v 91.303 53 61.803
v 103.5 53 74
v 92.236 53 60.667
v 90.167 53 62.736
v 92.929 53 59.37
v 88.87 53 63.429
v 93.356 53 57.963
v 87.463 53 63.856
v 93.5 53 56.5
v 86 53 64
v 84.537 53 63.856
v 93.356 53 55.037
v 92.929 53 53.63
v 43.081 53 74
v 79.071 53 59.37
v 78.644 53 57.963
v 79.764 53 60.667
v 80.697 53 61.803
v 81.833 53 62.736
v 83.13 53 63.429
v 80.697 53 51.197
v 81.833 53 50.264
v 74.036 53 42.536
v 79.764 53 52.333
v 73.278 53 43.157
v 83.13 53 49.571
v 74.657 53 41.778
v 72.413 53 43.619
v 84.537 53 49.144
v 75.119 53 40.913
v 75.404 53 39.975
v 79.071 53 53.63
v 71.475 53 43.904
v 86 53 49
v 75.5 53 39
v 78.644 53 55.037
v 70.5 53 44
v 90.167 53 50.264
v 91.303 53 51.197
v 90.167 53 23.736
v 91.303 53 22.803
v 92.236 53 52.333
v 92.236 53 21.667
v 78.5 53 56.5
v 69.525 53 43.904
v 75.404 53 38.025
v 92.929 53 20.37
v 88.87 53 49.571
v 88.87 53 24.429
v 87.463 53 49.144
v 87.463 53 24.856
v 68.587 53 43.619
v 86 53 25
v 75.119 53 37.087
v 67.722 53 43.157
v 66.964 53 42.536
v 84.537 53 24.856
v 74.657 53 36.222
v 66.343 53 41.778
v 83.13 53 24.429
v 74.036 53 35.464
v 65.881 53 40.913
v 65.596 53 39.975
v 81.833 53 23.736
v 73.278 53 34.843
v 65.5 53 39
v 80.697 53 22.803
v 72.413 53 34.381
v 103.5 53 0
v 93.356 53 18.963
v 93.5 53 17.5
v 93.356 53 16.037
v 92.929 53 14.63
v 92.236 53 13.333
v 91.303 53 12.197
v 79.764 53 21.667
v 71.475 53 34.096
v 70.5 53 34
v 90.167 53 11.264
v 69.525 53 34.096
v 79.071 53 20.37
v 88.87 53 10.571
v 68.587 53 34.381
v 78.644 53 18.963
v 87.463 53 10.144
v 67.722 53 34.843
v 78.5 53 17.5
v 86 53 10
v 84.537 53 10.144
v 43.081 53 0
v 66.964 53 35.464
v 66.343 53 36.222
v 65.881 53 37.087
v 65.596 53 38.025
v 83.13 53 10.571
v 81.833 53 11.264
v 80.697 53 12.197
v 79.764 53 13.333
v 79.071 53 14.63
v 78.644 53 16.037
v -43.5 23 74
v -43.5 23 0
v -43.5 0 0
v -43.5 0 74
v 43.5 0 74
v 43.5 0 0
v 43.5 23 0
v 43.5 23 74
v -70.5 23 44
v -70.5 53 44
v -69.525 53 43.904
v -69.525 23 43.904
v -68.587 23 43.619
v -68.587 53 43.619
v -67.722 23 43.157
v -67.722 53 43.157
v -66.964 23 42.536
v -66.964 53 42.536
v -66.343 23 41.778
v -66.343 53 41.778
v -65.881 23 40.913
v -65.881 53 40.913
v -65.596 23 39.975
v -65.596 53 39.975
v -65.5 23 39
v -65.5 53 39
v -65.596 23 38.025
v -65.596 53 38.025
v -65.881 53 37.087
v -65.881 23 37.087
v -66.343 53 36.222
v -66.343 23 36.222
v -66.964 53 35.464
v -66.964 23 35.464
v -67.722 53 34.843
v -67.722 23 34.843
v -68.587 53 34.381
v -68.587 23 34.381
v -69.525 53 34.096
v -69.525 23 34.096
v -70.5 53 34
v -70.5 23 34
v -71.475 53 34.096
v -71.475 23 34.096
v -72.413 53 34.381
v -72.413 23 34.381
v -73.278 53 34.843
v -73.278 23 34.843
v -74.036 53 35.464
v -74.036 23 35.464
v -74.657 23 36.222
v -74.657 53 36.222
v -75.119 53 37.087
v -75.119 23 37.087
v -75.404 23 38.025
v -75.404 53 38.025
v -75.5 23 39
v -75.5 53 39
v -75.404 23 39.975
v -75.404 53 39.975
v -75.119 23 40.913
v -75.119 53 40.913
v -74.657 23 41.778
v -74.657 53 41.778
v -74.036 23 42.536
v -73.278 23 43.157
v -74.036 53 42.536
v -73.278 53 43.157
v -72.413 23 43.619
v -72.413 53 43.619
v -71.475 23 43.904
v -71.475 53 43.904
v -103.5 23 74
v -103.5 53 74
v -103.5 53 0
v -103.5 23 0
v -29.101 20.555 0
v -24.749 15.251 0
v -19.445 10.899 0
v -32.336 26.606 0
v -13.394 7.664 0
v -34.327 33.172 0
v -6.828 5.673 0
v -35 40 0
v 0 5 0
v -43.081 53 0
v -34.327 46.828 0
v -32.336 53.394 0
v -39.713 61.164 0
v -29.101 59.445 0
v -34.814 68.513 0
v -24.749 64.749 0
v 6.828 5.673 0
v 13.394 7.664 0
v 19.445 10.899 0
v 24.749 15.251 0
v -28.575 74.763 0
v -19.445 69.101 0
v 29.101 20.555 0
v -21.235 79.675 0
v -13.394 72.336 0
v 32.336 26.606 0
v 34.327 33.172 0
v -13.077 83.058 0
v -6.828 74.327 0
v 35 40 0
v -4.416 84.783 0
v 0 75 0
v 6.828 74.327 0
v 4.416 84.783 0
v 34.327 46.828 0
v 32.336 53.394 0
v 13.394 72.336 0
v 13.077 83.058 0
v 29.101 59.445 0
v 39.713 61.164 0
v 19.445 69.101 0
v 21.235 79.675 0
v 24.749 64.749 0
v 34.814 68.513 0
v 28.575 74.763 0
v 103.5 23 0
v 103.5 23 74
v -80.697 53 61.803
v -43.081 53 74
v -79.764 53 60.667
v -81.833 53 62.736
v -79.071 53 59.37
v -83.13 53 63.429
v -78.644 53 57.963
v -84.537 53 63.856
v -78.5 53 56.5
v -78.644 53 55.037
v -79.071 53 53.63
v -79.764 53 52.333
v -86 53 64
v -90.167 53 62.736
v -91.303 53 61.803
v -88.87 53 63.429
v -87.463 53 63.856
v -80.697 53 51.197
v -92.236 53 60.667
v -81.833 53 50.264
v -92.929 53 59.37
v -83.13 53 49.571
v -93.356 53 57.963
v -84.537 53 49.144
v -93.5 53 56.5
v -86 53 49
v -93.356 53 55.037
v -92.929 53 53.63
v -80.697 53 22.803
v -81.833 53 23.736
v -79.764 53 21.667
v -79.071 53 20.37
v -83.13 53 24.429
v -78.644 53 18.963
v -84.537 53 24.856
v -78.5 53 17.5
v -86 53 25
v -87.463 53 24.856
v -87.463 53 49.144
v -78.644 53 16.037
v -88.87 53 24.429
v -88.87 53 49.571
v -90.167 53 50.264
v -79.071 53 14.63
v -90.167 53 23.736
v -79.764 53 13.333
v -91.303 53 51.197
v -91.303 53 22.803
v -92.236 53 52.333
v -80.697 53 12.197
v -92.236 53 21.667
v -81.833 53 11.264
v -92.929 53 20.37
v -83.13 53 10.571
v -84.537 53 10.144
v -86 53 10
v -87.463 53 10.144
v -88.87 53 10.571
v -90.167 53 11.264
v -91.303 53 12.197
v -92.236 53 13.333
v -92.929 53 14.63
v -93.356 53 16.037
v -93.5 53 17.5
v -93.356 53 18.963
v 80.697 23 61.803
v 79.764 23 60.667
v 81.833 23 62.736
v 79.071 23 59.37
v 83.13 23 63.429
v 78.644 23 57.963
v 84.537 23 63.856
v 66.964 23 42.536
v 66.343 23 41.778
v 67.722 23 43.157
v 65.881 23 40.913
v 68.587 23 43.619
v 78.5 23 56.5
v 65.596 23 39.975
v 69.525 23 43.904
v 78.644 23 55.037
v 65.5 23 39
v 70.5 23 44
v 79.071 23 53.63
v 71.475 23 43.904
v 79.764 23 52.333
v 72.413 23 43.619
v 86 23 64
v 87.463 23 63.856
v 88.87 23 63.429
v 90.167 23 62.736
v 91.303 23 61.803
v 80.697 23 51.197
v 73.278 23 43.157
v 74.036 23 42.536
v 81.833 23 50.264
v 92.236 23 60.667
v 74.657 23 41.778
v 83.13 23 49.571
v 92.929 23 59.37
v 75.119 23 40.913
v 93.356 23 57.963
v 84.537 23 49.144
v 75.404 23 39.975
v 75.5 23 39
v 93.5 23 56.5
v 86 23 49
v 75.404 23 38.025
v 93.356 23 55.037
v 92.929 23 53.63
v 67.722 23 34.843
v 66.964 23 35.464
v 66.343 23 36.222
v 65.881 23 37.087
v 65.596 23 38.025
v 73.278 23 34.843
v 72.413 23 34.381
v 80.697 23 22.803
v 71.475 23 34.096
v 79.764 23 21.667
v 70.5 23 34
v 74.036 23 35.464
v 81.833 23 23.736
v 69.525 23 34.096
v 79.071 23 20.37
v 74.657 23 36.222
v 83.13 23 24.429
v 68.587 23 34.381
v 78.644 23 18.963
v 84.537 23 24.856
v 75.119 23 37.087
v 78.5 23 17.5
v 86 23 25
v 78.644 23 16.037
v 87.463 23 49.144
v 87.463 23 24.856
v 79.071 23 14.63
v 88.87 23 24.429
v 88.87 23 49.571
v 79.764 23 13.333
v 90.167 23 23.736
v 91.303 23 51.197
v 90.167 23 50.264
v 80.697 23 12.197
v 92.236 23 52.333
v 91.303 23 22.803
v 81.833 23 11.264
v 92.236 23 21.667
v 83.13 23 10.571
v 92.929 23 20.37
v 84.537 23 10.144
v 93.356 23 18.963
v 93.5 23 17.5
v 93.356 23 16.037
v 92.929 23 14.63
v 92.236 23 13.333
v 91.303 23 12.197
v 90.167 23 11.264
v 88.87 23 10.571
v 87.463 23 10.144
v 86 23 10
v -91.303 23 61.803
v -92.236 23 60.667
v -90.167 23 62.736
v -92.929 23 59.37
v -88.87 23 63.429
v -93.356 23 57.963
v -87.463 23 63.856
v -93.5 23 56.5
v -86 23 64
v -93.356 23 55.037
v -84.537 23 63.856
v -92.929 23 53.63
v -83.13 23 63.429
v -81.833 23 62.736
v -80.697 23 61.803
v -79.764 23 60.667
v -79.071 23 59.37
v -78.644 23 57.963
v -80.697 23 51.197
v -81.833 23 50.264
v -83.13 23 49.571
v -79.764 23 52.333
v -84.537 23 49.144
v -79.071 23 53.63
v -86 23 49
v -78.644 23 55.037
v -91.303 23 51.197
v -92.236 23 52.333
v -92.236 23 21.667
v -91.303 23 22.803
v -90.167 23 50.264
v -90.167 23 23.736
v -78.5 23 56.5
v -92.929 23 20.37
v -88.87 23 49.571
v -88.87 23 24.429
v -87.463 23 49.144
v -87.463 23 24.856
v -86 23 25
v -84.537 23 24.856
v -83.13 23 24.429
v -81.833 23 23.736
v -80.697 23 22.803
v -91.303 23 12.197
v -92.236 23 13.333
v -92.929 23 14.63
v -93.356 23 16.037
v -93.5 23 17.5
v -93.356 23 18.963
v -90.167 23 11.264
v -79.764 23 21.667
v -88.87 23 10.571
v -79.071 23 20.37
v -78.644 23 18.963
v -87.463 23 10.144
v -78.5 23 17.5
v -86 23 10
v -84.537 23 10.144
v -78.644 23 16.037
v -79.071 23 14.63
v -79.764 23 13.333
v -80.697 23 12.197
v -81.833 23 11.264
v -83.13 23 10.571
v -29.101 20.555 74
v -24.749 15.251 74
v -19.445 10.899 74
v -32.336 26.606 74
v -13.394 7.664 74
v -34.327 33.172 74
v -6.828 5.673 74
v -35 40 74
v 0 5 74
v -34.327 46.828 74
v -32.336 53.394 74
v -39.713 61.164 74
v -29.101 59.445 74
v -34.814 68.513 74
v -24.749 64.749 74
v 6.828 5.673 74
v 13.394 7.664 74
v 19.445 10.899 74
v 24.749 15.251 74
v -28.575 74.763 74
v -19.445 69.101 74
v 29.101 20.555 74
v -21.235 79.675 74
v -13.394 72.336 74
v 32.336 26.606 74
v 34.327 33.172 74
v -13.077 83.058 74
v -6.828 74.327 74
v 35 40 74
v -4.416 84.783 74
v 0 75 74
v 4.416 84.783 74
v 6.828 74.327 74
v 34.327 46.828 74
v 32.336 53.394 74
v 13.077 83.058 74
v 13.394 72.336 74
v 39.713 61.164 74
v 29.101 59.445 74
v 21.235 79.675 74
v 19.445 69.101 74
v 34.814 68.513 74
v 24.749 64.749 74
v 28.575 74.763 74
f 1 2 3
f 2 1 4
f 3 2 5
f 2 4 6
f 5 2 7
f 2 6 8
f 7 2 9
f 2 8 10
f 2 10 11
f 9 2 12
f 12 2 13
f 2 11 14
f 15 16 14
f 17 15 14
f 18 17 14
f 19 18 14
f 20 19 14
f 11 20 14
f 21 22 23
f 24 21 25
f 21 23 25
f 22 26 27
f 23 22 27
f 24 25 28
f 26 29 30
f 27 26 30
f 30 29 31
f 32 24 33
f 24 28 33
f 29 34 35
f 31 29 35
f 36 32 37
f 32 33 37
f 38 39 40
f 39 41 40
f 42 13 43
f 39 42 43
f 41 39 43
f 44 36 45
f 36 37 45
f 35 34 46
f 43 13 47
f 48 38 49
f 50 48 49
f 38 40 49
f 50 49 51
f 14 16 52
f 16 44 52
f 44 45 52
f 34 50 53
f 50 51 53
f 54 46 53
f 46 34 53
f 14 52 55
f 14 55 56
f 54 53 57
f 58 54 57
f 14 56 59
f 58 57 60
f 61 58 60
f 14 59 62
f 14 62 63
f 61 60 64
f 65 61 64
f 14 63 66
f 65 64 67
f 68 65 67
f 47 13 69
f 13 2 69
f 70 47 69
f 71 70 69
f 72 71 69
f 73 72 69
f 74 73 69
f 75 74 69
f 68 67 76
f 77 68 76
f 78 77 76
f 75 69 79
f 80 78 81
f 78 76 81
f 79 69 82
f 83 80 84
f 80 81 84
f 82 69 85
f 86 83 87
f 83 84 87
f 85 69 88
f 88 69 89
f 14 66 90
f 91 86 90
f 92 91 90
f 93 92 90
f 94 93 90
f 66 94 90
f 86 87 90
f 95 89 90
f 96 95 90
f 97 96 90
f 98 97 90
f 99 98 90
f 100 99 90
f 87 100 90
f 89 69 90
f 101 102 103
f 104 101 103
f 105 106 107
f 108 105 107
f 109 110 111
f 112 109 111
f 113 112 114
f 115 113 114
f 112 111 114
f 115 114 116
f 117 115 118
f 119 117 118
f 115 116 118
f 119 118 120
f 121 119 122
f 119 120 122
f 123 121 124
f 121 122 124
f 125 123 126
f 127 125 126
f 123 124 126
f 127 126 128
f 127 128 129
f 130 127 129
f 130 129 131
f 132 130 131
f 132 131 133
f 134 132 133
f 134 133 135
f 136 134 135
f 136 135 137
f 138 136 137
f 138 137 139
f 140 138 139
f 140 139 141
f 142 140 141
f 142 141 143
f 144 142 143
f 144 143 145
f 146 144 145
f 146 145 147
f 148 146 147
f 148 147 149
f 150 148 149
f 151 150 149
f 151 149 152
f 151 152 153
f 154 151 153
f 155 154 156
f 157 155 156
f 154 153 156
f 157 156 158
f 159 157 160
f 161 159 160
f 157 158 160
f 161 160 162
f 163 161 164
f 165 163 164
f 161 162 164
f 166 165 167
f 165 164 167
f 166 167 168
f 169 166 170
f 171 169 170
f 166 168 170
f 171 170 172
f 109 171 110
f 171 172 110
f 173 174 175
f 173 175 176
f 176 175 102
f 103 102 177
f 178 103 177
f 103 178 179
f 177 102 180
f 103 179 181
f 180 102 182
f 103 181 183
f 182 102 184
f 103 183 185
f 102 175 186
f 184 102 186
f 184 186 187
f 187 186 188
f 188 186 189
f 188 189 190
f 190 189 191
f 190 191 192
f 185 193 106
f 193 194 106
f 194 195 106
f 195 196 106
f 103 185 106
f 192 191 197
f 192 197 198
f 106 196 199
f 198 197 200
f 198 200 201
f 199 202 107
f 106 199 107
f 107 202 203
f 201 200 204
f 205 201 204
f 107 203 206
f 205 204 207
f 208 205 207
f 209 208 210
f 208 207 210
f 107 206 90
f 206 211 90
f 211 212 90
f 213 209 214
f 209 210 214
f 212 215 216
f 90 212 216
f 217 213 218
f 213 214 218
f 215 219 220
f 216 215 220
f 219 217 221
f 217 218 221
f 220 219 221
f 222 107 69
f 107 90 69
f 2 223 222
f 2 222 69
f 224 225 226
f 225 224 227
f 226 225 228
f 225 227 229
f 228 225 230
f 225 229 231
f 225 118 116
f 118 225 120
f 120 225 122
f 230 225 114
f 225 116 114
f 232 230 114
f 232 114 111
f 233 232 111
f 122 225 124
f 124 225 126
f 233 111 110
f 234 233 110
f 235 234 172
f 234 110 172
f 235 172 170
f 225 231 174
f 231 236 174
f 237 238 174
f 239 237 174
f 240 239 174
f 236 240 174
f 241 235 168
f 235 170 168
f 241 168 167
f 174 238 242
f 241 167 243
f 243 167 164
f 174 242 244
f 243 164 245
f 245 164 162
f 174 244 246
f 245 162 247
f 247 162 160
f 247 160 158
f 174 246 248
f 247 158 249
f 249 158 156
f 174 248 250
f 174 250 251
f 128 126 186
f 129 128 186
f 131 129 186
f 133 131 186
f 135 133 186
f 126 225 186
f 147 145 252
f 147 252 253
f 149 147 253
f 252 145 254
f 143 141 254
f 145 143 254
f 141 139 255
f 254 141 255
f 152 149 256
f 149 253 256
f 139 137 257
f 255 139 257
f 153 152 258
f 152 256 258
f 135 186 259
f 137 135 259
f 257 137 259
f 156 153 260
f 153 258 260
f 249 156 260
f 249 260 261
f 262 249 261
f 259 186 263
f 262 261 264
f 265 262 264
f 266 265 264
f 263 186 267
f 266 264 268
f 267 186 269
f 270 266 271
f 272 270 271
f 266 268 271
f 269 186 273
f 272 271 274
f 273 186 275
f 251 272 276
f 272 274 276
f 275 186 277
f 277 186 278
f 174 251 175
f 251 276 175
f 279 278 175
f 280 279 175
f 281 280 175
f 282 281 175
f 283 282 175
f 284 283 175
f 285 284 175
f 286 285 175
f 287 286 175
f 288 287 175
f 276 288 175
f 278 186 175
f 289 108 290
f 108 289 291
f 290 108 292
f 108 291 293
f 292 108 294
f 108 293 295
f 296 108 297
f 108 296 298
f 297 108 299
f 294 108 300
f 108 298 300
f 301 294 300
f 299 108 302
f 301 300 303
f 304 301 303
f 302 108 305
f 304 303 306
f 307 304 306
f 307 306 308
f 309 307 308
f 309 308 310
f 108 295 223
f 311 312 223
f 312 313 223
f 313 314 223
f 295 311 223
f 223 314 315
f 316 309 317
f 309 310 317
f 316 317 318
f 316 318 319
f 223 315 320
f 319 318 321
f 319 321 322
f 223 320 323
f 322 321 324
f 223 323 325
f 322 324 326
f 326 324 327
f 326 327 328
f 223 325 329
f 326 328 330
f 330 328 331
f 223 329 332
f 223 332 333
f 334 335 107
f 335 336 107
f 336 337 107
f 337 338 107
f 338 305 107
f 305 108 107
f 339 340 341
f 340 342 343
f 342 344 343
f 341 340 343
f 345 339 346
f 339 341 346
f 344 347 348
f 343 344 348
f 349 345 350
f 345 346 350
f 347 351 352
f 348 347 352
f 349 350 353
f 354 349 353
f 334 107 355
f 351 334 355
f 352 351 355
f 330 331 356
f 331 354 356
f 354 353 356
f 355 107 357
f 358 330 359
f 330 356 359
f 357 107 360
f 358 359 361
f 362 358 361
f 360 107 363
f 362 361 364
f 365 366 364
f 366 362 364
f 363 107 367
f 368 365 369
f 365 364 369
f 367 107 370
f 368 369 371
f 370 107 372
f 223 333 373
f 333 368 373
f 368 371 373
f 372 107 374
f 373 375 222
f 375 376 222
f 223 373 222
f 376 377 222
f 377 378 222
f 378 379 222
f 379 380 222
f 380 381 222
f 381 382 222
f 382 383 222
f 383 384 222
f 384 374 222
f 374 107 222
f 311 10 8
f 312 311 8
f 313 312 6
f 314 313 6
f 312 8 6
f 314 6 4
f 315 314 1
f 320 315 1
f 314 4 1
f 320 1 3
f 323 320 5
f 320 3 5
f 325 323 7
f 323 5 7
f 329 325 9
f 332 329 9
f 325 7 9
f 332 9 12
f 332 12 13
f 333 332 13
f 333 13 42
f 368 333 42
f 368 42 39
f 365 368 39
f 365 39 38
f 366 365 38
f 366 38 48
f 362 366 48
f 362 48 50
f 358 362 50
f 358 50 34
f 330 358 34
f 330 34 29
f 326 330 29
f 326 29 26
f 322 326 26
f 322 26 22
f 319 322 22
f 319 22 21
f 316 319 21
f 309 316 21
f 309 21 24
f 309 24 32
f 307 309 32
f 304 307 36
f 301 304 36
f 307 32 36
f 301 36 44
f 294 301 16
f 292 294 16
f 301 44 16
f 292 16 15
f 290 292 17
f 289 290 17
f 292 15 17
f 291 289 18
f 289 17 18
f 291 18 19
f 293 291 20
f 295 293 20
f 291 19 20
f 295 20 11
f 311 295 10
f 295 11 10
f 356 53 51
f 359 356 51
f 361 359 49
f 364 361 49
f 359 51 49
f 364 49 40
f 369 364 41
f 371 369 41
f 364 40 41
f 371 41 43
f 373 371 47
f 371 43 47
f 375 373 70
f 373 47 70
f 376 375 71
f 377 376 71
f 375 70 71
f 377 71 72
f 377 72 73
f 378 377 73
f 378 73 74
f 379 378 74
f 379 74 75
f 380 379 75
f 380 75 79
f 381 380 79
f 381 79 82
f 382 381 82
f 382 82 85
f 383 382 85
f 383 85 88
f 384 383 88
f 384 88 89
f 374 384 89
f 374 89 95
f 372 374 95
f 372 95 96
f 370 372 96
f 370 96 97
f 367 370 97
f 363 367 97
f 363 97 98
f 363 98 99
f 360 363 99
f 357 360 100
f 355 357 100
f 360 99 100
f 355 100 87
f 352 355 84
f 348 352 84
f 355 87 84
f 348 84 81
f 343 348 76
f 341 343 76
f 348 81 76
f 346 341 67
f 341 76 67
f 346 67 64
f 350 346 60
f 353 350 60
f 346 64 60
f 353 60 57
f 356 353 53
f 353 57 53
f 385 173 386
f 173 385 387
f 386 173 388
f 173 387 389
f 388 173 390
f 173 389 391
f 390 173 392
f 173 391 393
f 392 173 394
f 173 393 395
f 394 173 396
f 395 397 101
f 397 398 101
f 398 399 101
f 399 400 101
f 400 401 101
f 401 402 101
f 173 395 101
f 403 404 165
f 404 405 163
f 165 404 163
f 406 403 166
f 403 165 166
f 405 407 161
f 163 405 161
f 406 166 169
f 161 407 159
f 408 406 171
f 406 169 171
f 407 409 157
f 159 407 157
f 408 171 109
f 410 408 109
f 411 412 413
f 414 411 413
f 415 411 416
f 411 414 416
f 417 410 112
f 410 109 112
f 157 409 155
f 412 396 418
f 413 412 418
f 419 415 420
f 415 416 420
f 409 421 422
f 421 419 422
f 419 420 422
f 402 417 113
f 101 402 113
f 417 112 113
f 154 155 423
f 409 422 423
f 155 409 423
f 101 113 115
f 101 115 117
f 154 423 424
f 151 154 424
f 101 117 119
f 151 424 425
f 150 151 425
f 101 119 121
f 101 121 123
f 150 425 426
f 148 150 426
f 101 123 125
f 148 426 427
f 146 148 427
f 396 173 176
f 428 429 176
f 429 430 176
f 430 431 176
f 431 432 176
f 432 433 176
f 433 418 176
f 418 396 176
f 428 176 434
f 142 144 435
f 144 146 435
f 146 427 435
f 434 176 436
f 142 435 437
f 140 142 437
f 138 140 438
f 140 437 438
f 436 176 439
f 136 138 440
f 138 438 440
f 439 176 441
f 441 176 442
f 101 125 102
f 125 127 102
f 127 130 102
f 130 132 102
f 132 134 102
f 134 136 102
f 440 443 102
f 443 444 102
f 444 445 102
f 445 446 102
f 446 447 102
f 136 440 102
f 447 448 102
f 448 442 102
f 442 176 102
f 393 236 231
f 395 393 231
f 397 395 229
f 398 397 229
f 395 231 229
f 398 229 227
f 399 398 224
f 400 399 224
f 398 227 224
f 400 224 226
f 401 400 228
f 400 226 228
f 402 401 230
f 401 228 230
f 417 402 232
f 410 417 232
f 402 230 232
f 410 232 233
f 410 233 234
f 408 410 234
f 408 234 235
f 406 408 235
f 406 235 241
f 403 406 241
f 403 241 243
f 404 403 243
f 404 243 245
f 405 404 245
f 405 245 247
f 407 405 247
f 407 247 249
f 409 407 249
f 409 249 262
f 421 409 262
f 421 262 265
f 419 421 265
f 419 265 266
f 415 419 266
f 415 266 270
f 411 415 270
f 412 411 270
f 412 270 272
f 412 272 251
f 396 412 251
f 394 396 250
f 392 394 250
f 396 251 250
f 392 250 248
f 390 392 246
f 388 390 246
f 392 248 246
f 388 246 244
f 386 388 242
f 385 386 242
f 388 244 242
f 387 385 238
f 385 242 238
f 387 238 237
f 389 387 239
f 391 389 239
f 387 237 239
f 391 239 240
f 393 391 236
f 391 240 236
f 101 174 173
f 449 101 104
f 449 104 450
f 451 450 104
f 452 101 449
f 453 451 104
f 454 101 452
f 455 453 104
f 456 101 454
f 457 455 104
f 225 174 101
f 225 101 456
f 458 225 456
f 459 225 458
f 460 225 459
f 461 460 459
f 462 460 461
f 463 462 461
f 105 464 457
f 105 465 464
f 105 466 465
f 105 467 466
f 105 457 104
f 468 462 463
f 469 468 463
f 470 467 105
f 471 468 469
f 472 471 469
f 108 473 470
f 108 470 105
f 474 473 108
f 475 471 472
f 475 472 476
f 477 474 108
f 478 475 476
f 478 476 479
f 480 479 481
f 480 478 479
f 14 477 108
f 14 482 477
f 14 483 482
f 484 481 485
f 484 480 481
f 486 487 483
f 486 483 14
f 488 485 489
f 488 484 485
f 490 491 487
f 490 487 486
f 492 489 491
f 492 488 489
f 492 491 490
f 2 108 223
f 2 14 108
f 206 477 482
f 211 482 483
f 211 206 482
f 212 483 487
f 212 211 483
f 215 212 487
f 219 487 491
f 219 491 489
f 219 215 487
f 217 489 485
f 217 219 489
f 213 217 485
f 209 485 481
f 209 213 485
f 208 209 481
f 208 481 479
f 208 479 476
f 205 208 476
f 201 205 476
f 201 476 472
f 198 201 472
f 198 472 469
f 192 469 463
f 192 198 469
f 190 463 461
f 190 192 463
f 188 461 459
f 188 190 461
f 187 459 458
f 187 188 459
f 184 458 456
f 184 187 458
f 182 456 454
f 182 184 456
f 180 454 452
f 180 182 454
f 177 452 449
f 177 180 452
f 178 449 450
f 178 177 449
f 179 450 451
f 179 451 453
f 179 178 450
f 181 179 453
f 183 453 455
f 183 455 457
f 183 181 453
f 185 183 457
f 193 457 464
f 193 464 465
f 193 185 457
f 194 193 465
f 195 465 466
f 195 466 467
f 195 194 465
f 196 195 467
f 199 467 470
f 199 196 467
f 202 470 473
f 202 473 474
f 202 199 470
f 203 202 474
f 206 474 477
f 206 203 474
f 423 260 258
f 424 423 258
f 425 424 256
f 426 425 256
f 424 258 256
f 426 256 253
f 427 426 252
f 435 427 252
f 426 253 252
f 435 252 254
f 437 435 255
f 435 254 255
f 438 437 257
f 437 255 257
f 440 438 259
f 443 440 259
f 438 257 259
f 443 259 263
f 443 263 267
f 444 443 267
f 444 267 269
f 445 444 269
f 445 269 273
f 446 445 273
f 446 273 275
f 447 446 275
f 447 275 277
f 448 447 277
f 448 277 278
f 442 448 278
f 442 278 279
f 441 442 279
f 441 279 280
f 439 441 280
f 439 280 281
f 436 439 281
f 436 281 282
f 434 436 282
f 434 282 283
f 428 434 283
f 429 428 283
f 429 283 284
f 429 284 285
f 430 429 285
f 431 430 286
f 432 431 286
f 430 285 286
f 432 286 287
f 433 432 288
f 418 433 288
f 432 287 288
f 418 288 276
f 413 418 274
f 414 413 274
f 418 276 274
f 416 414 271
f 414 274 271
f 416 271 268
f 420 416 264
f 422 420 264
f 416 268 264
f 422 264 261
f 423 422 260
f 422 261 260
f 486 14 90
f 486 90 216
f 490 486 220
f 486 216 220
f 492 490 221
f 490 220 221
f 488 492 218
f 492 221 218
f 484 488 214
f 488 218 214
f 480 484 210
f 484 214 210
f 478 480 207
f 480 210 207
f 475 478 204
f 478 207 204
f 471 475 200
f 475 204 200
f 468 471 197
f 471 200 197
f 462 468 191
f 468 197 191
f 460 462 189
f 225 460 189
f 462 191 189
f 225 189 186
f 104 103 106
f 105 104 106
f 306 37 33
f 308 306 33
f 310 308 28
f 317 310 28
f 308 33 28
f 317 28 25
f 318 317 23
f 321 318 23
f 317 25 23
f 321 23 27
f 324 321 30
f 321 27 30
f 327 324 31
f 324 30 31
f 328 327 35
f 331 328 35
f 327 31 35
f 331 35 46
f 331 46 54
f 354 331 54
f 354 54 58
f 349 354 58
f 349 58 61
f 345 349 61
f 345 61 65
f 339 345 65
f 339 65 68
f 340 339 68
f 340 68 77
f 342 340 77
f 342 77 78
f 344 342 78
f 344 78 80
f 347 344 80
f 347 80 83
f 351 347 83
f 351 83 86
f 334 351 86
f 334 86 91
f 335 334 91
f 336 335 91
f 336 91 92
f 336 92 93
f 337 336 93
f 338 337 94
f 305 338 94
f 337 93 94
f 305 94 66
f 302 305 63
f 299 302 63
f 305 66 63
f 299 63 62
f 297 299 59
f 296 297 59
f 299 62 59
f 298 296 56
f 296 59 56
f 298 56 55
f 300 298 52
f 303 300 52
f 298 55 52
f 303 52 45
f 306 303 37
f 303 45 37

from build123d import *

# Parameters (mm, degrees)
SKETCH_3_R          = 35
EXTRUDE_2_DEPTH     = 74
SKETCH_4_R          = 7.5
SKETCH_4_R_2        = 5
CUT_EXTRUDE_1_DEPTH = 138.830511861


with BuildPart() as part:
    # 草图3 → 凸台-拉伸2 (new body)
    with BuildSketch(Plane.XY):
        with BuildLine():
            Line((-43.5, 0), (43.5, 0))
            Line((43.5, 0), (43.5, 23))
            Line((43.5, 23), (103.5, 23))
            Line((103.5, 23), (103.5, 53))
            Line((103.5, 53), (43.081318457, 53))
            ThreePointArc((43.081318457, 53), (0, 85), (-43.081318457, 53))
            Line((-43.081318457, 53), (-103.5, 53))
            Line((-103.5, 53), (-103.5, 23))
            Line((-103.5, 23), (-43.5, 23))
            Line((-43.5, 23), (-43.5, 0))
        make_face()
        with Locations((0, 40)):
            Circle(SKETCH_3_R, mode=Mode.SUBTRACT)
    extrude(amount=EXTRUDE_2_DEPTH)

    # 草图4 → 切除-拉伸1 (cut, through all)
    with BuildSketch(Plane(origin=(0, 53, 0), x_dir=(1, 0, 0), z_dir=(0, 1, 0))):
        with Locations(Location((86, -17.5, 0), (0, 0, 270))):
            Circle(SKETCH_4_R)
        with Locations(Location((86, -56.5, 0), (0, 0, 270))):
            Circle(SKETCH_4_R)
        with Locations(Location((70.5, -39, 0), (0, 0, 270))):
            Circle(SKETCH_4_R_2)
        with Locations(Location((-86, -17.5, 0), (0, 0, 270))):
            Circle(SKETCH_4_R)
        with Locations(Location((-86, -56.5, 0), (0, 0, 270))):
            Circle(SKETCH_4_R)
        with Locations(Location((-70.5, -39, 0), (0, 0, 270))):
            Circle(SKETCH_4_R_2)
    extrude(amount=-CUT_EXTRUDE_1_DEPTH, mode=Mode.SUBTRACT)


solid = part.part
